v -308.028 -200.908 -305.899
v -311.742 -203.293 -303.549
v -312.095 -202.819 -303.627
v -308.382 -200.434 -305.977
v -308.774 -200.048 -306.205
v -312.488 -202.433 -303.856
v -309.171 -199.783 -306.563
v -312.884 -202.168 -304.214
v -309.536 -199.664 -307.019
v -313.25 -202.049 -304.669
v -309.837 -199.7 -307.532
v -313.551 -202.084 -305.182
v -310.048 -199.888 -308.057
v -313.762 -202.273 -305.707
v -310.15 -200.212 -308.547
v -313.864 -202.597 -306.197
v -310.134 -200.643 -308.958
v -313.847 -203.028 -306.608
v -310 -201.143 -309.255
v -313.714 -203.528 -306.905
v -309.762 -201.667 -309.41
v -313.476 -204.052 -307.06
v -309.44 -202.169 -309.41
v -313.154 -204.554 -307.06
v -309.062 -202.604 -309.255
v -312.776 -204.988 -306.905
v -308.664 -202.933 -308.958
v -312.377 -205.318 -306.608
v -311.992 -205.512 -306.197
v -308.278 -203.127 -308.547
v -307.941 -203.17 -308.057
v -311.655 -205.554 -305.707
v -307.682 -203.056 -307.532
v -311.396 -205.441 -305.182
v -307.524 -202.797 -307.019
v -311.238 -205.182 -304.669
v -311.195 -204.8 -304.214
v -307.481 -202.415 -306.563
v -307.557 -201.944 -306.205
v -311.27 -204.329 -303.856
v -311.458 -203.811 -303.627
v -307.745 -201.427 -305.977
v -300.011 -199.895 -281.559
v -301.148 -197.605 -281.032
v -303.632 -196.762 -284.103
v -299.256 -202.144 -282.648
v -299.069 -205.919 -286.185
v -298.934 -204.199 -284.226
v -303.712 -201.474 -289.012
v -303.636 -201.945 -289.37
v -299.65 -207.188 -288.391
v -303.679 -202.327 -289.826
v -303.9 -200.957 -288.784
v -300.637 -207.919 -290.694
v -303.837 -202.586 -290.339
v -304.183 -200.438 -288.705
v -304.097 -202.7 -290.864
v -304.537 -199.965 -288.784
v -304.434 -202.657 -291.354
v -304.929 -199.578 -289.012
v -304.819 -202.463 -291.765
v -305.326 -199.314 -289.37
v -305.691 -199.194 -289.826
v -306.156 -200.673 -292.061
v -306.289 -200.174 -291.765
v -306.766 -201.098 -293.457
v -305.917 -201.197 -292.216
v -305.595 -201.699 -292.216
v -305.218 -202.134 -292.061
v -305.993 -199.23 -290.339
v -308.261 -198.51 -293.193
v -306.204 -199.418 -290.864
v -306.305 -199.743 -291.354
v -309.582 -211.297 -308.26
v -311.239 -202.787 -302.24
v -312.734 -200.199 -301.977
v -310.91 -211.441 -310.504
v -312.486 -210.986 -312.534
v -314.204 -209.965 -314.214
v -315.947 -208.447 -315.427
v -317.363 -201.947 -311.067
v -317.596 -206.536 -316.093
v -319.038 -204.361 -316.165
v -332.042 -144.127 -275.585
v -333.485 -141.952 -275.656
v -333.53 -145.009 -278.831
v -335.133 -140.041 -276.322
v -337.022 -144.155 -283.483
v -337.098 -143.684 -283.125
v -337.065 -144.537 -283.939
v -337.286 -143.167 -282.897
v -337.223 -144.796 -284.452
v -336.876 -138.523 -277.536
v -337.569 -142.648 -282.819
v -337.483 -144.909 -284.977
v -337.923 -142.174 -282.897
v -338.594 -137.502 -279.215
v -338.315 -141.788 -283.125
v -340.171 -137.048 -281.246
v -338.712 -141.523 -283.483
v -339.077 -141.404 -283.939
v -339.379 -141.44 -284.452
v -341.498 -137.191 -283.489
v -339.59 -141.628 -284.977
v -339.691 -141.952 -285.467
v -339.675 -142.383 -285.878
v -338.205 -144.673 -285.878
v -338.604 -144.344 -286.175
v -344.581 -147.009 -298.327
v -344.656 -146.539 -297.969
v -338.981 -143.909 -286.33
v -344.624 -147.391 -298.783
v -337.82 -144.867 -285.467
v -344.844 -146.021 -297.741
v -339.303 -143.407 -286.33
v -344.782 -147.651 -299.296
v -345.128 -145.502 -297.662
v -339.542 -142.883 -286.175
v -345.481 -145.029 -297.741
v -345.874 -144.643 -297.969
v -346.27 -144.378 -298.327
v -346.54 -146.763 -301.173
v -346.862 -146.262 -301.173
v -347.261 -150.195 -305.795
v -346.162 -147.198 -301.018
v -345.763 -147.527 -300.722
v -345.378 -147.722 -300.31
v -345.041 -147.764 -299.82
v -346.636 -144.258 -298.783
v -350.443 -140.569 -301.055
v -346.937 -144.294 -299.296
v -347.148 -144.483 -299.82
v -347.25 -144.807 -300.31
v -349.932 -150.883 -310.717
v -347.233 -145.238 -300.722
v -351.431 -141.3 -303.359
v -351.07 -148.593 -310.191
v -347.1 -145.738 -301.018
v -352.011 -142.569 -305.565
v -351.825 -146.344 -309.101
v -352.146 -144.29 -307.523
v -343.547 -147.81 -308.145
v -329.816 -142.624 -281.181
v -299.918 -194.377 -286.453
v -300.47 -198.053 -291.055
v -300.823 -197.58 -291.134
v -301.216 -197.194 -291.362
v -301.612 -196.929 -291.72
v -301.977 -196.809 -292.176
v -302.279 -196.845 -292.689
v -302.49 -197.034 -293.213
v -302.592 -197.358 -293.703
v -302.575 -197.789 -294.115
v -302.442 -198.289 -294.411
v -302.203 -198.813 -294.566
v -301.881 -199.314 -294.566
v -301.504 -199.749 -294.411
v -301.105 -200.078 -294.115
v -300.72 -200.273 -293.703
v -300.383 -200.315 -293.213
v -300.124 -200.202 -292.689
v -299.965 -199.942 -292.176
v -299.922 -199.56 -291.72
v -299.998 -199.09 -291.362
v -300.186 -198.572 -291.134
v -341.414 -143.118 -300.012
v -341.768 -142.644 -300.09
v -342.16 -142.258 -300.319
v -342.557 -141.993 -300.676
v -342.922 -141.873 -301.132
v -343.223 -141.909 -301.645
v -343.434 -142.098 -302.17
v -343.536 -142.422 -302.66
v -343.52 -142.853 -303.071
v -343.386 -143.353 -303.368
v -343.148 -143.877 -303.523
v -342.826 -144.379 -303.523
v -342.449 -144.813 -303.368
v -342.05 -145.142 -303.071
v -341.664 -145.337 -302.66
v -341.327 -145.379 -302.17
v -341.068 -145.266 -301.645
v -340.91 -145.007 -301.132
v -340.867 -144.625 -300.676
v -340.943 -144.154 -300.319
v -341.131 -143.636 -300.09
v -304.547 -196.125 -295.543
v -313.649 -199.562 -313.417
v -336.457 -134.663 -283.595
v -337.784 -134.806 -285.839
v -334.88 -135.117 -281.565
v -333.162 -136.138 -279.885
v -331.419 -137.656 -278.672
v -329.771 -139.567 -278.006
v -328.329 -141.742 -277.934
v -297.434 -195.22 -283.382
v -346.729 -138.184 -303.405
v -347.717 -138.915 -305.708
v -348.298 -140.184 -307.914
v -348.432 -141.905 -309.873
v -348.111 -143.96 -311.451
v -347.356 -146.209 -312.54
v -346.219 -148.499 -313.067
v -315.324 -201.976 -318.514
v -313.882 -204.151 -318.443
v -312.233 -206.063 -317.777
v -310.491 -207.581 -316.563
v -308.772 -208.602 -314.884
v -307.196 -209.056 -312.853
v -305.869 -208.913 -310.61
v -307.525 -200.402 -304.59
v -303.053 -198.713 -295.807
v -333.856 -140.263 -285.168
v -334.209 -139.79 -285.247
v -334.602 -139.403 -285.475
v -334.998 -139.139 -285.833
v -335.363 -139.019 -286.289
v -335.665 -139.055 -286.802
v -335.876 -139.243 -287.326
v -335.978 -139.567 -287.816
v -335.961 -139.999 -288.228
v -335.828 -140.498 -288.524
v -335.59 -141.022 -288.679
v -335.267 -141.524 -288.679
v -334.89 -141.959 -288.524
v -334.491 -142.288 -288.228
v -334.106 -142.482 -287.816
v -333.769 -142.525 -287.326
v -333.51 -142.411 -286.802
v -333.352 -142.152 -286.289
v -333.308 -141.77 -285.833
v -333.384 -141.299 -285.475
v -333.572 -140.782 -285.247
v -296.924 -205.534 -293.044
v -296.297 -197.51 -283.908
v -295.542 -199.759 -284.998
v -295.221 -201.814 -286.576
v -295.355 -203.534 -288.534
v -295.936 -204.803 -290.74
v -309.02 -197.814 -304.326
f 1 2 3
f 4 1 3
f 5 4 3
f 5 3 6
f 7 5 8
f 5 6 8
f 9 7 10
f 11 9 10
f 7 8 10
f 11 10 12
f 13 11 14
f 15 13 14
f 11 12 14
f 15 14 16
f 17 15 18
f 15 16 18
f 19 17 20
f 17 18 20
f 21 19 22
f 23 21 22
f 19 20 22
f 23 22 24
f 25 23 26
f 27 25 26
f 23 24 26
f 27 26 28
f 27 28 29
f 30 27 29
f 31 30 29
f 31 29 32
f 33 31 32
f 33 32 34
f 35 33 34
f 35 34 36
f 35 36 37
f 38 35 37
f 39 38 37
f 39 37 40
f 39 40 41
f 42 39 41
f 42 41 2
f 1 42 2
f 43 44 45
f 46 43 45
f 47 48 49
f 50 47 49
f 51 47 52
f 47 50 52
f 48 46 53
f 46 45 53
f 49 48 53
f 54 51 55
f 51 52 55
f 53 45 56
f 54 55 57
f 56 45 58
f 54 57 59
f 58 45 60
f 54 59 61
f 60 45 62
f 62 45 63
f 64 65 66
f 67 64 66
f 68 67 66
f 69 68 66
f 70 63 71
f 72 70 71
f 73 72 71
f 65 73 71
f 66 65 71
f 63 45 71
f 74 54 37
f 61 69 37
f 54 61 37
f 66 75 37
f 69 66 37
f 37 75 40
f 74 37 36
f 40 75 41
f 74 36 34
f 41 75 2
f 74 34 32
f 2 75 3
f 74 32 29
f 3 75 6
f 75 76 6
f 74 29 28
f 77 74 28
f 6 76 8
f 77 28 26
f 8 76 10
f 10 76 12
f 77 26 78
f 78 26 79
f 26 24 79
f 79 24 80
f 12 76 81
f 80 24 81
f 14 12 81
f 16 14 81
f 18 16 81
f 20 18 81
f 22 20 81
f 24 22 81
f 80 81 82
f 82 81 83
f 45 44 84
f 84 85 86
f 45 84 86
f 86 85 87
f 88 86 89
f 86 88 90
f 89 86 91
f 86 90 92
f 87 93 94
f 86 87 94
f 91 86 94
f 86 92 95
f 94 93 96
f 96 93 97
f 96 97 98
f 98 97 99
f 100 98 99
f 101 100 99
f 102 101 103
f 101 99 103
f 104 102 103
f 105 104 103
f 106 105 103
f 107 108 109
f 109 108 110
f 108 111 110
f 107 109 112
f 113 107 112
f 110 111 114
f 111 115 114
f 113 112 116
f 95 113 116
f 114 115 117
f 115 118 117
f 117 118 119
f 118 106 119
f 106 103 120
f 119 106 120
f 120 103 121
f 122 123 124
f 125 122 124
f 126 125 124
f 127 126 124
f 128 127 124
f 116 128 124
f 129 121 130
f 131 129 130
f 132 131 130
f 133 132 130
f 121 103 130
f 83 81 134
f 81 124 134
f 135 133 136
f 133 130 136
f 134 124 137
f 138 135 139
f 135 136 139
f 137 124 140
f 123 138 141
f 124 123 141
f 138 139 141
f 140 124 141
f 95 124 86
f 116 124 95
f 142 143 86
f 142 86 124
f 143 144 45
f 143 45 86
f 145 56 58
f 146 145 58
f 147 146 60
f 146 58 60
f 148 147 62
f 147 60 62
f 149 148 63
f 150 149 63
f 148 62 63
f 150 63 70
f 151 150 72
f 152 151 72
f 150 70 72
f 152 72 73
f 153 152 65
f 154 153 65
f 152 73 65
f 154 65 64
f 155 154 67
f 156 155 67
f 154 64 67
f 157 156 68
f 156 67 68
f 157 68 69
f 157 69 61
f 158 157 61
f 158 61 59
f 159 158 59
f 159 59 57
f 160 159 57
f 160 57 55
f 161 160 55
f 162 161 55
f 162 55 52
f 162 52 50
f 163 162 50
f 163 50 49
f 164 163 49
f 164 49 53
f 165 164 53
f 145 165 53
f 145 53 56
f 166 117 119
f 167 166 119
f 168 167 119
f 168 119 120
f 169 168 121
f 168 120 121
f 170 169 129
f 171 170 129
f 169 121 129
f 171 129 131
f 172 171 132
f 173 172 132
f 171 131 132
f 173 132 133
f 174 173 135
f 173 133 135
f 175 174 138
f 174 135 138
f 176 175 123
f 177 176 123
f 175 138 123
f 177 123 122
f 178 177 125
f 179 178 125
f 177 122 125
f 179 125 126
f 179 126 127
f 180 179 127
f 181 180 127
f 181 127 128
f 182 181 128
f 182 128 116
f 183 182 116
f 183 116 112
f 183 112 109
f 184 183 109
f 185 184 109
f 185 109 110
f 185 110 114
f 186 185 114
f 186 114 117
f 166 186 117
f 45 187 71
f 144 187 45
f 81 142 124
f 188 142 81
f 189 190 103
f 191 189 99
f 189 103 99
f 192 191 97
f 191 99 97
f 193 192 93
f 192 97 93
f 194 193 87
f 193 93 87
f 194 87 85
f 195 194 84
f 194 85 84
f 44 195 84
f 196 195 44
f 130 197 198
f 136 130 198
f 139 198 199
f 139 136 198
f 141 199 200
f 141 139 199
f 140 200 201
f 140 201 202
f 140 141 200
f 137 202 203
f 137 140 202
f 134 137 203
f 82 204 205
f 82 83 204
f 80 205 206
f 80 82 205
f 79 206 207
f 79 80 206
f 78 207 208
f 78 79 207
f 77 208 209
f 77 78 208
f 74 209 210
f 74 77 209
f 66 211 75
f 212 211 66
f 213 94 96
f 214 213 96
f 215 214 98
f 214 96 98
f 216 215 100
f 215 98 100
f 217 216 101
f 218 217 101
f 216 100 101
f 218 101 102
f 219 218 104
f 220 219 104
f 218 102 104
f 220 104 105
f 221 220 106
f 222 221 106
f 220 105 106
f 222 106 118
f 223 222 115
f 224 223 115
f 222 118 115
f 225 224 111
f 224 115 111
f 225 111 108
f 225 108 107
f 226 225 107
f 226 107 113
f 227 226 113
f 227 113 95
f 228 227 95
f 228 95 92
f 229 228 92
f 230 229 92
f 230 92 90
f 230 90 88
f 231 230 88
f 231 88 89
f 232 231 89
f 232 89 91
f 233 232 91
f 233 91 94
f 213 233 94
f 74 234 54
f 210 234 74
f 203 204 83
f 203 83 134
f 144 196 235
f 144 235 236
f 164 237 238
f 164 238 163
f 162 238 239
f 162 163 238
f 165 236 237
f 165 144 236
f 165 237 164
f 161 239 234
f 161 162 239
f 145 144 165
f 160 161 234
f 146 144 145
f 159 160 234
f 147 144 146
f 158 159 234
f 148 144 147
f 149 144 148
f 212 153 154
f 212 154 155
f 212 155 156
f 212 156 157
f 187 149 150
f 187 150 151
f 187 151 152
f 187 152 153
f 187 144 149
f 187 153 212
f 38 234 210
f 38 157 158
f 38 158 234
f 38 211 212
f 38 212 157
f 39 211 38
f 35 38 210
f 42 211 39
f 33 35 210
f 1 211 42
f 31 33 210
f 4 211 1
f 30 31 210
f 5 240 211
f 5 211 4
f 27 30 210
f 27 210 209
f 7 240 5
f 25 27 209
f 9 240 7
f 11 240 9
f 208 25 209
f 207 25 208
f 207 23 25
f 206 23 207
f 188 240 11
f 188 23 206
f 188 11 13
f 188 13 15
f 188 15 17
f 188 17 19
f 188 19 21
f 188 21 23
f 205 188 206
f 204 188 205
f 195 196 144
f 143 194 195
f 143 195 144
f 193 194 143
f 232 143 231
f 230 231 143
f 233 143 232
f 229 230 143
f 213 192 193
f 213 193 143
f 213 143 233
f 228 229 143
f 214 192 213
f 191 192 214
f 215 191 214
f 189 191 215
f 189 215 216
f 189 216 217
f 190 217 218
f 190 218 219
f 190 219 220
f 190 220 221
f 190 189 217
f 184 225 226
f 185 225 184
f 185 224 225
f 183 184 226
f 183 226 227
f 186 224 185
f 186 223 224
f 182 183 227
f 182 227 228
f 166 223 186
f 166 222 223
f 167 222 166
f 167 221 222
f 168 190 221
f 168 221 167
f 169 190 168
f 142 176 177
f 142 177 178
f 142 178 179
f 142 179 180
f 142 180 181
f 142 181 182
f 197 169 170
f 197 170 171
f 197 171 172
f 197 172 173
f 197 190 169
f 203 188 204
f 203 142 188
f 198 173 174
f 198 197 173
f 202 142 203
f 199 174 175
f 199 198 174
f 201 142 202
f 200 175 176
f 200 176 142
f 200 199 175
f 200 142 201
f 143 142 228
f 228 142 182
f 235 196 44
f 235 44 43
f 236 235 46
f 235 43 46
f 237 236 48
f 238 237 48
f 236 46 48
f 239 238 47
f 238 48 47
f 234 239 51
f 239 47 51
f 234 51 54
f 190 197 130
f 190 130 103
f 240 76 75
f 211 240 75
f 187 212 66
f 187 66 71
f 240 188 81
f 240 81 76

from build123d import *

# Parameters (mm, degrees)
BOSS_EXTRUDE1_DEPTH = 5
SKETCH2_R           = 2
CUT_EXTRUDE1_DEPTH  = 10
FILLET1_R           = 10


with BuildPart() as part:
    # Sketch1 → Boss-Extrude1 (new body)
    with BuildSketch(Plane(origin=(-134.331980559, -86.262659899, 84.991923549), x_dir=(0.395424411, 0.253925843, 0.882701083), z_dir=(-0.742744505, -0.476961006, 0.469934888))):
        Polygon((-449.960059364, 72.073536166), (-410.158714417, 68.091961048), (-418.320943409, -13.500796093), (-458.122288356, -9.519220975), align=None)
        Polygon((-431.102989517, -0.46855114), (-420.804391512, -1.498783702), (-414.832028835, 58.203233718), (-445.379561081, 61.259092621), (-451.351923758, 1.557075201), (-441.053325753, 0.526842639), (-441.351943887, -2.458258232), (-431.40160765, -3.453652011), align=None, mode=Mode.SUBTRACT)
    extrude(amount=BOSS_EXTRUDE1_DEPTH)

    # Sketch2 → Cut-Extrude1 (cut)
    with BuildSketch(Plane(origin=(-138.045703084, -88.647464931, 87.341597987), x_dir=(0.395424411, 0.253925843, 0.882701083), z_dir=(-0.742744505, -0.476961006, 0.469934888))):
        with Locations((-444.834579578, -2.61236419)):
            Circle(SKETCH2_R)
        with Locations((-428.018511338, -4.294579677)):
            Circle(SKETCH2_R)
        with Locations((-438.165441255, 64.054888596)):
            Circle(SKETCH2_R)
        with Locations((-421.349373015, 62.372673109)):
            Circle(SKETCH2_R)
    extrude(amount=-CUT_EXTRUDE1_DEPTH, mode=Mode.SUBTRACT)

    # Fillet1
    fillet1_edges = [part.edges().sort_by_distance(p)[0] for p in [
        (-353.05843578, -141.065625808, -311.013470799),
        (-335.168597716, -134.309312615, -275.880780522),
        (-294.308099004, -205.037739583, -283.08558889),
        (-312.197937067, -211.794052776, -318.218279167),
    ]]
    fillet(fillet1_edges, radius=FILLET1_R)


solid = part.part
